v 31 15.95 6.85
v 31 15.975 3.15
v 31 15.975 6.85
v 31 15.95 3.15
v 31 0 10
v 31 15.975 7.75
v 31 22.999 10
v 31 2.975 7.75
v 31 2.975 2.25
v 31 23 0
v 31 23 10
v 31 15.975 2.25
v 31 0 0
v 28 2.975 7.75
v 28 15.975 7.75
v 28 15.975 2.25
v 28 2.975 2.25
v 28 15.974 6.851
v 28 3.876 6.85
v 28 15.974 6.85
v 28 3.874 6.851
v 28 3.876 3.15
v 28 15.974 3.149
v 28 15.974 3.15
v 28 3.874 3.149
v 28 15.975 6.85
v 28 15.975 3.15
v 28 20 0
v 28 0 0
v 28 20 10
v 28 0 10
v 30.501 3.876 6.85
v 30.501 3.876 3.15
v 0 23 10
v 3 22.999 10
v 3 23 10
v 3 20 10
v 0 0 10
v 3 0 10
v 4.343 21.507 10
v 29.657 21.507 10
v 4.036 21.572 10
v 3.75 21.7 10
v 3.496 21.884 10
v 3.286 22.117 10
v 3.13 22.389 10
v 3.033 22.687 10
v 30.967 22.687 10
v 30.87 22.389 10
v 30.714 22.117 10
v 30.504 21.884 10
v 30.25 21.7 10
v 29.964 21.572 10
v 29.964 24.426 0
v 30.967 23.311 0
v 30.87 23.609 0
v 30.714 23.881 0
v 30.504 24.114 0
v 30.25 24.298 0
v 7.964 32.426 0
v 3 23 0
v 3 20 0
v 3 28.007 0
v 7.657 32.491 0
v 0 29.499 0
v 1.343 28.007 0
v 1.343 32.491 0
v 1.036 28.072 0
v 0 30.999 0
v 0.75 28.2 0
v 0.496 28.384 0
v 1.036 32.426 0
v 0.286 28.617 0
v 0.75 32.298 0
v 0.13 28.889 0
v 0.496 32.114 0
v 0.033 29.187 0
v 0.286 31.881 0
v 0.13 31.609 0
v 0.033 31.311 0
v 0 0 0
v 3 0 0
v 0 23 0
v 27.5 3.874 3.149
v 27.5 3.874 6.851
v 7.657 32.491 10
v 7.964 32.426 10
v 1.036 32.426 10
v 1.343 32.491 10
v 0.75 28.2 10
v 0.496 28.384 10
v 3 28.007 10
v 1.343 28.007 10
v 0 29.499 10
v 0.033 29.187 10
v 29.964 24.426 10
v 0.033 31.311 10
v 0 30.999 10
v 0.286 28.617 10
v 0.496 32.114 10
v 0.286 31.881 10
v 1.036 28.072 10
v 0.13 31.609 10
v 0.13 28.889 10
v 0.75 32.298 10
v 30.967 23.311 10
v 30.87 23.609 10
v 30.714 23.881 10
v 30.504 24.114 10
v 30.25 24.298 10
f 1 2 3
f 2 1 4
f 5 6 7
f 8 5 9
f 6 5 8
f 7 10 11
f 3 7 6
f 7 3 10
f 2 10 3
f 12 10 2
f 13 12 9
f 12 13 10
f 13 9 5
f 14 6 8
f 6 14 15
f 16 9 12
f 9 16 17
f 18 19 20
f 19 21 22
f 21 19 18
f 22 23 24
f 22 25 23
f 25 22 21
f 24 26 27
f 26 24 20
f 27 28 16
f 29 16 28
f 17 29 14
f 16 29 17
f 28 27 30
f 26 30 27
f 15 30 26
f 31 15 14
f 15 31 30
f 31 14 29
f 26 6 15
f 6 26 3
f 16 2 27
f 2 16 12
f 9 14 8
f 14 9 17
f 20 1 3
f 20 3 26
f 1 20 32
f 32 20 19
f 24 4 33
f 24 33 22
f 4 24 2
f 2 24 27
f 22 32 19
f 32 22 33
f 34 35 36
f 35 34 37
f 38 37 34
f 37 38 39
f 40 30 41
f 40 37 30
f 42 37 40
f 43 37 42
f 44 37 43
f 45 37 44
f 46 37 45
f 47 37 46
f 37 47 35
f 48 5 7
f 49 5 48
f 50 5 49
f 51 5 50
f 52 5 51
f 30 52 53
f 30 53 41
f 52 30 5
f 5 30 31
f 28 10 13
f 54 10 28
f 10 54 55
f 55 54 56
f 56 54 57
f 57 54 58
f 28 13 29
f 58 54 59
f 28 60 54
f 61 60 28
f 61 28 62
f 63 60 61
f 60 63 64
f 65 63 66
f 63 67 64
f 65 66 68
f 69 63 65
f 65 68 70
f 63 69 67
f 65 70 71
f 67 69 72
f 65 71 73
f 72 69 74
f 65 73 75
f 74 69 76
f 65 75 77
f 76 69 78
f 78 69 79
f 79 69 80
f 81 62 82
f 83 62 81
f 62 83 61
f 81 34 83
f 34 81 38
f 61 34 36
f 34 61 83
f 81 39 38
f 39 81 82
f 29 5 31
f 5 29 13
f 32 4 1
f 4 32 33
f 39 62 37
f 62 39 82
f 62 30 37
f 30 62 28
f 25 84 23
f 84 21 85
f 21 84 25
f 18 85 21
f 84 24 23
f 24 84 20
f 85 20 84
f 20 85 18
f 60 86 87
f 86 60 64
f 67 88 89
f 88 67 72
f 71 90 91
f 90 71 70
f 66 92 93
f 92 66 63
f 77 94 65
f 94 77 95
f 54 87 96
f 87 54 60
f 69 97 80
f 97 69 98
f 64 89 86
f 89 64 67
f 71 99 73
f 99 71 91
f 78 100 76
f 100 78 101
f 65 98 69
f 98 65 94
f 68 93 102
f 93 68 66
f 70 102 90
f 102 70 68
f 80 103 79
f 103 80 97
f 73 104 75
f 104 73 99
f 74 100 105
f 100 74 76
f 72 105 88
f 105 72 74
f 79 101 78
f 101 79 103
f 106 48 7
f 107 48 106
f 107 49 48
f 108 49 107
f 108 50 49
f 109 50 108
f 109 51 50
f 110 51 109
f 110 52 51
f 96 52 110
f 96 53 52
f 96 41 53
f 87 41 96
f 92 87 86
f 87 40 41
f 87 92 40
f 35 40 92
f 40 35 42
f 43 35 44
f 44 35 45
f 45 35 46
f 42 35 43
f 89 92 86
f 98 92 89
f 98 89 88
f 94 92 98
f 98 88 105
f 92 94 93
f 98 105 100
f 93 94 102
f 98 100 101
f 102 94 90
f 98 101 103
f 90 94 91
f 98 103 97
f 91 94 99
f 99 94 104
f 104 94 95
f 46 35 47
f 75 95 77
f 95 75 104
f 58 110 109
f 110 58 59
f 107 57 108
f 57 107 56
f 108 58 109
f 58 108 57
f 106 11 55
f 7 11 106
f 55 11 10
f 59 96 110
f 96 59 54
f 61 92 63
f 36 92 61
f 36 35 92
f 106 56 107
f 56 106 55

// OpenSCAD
//Change the following values to your needs.
// Size of your desk. x>0
desk_size = 25;

// Width of your headphone.
cradle_width = 5;

// Thickness of your headphone.
cradle_height = 3;

// Size of the walls of the object. x>0
wall_size = 3;

// Width of the clamp. x>0
clamp_width = 10;

// Depth of the clamp. x>0
clamp_depth = 20;

// Determines tightness of clamp. 0=<x<wall_size
tightinator_offset = .5;

// Preferred relative width of the tightinator. 0 <=x< 1
tightinator_width = .55;

// Preferred relative height/depth of the tightinator. 0 <=x< 1 
tightinator_height = .65;

// Size of the gap around the tightinator (cut-out). 0 <=x<= tightinator_width*12.5 (roughly)
cutout = .9;

// Preferred width of the hook. 0<x
hook_width = 10;

// Place the hook at the left, right, or centre.
hook_position = "centre"; // [left, centre, right]

// STOP! No need to change these values:
left = clamp_width-hook_width;
centre = clamp_width/2-hook_width/2;
right = 1 * 0;

//
// Here be code...
//

// Some voodoo to bypass the customizer
if (hook_position == "centre") {
	thing(centre);
} else if (hook_position == "right") {
	thing(right);
} else {
	thing(left);
}

// This is the proverbial "it". TADA.wav!
module thing(hookpos)
{
    render()
	union() {
		clamp();
		hook(hookpos);
	}
}

// The part that fits on the desk.
module clamp() {
	union(){
	difference() {
		//main body
		cube([desk_size+2*wall_size,clamp_depth+wall_size,clamp_width]);
		translate([desk_size+wall_size+.001,0,0])
		  #clamp_angle();
		translate([wall_size, 0, 0])
		  cube([desk_size,clamp_depth,clamp_width]);
		//cut-out part
		translate([desk_size+wall_size, (1-tightinator_height)/2*(clamp_depth-wall_size), (1-tightinator_width)/2*clamp_width])
	  	  difference() {
			cube([wall_size,clamp_depth*tightinator_height,clamp_width*tightinator_width]);
			translate([0, cutout+.001, cutout])
		  	cube([wall_size,(clamp_depth*tightinator_height)-cutout,(clamp_width*tightinator_width)-2*cutout]);
	      }		
	}
	translate([desk_size,0,0])
	  clamp_angle();
	}
}

// The TIGHTINATOR. Part of the clamp.
module clamp_angle() {
	a = ((1-tightinator_height)/2*(clamp_depth-wall_size))+cutout-.001;
	b = a + ((clamp_depth*tightinator_height)-cutout);
	translate([0,0,(1-tightinator_width)/2*clamp_width+cutout-.001])
	linear_extrude(height=(clamp_width*tightinator_width+.001)-2*cutout+.001) polygon([[wall_size,a],[wall_size,b],[wall_size-tightinator_offset,a]]);
}

// The part your headset hangs on/off.
module hook(hookpos) {
$fn=30;
translate([wall_size/2, clamp_depth+wall_size-0.001, hookpos])
	minkowski(){
		difference() {
			linear_extrude(height=hook_width) polygon([[cradle_height,0],[cradle_height,cradle_width+wall_size/2],[0,cradle_width+wall_size/2],[0,cradle_width+wall_size],[cradle_height+wall_size,cradle_width+wall_size],[desk_size+wall_size,0]]);
			//cylinder(h = hook_width, r = cradle_width+wall_size);
		} 
		cylinder(h = 0.0001, r = wall_size/2);
	}
}
